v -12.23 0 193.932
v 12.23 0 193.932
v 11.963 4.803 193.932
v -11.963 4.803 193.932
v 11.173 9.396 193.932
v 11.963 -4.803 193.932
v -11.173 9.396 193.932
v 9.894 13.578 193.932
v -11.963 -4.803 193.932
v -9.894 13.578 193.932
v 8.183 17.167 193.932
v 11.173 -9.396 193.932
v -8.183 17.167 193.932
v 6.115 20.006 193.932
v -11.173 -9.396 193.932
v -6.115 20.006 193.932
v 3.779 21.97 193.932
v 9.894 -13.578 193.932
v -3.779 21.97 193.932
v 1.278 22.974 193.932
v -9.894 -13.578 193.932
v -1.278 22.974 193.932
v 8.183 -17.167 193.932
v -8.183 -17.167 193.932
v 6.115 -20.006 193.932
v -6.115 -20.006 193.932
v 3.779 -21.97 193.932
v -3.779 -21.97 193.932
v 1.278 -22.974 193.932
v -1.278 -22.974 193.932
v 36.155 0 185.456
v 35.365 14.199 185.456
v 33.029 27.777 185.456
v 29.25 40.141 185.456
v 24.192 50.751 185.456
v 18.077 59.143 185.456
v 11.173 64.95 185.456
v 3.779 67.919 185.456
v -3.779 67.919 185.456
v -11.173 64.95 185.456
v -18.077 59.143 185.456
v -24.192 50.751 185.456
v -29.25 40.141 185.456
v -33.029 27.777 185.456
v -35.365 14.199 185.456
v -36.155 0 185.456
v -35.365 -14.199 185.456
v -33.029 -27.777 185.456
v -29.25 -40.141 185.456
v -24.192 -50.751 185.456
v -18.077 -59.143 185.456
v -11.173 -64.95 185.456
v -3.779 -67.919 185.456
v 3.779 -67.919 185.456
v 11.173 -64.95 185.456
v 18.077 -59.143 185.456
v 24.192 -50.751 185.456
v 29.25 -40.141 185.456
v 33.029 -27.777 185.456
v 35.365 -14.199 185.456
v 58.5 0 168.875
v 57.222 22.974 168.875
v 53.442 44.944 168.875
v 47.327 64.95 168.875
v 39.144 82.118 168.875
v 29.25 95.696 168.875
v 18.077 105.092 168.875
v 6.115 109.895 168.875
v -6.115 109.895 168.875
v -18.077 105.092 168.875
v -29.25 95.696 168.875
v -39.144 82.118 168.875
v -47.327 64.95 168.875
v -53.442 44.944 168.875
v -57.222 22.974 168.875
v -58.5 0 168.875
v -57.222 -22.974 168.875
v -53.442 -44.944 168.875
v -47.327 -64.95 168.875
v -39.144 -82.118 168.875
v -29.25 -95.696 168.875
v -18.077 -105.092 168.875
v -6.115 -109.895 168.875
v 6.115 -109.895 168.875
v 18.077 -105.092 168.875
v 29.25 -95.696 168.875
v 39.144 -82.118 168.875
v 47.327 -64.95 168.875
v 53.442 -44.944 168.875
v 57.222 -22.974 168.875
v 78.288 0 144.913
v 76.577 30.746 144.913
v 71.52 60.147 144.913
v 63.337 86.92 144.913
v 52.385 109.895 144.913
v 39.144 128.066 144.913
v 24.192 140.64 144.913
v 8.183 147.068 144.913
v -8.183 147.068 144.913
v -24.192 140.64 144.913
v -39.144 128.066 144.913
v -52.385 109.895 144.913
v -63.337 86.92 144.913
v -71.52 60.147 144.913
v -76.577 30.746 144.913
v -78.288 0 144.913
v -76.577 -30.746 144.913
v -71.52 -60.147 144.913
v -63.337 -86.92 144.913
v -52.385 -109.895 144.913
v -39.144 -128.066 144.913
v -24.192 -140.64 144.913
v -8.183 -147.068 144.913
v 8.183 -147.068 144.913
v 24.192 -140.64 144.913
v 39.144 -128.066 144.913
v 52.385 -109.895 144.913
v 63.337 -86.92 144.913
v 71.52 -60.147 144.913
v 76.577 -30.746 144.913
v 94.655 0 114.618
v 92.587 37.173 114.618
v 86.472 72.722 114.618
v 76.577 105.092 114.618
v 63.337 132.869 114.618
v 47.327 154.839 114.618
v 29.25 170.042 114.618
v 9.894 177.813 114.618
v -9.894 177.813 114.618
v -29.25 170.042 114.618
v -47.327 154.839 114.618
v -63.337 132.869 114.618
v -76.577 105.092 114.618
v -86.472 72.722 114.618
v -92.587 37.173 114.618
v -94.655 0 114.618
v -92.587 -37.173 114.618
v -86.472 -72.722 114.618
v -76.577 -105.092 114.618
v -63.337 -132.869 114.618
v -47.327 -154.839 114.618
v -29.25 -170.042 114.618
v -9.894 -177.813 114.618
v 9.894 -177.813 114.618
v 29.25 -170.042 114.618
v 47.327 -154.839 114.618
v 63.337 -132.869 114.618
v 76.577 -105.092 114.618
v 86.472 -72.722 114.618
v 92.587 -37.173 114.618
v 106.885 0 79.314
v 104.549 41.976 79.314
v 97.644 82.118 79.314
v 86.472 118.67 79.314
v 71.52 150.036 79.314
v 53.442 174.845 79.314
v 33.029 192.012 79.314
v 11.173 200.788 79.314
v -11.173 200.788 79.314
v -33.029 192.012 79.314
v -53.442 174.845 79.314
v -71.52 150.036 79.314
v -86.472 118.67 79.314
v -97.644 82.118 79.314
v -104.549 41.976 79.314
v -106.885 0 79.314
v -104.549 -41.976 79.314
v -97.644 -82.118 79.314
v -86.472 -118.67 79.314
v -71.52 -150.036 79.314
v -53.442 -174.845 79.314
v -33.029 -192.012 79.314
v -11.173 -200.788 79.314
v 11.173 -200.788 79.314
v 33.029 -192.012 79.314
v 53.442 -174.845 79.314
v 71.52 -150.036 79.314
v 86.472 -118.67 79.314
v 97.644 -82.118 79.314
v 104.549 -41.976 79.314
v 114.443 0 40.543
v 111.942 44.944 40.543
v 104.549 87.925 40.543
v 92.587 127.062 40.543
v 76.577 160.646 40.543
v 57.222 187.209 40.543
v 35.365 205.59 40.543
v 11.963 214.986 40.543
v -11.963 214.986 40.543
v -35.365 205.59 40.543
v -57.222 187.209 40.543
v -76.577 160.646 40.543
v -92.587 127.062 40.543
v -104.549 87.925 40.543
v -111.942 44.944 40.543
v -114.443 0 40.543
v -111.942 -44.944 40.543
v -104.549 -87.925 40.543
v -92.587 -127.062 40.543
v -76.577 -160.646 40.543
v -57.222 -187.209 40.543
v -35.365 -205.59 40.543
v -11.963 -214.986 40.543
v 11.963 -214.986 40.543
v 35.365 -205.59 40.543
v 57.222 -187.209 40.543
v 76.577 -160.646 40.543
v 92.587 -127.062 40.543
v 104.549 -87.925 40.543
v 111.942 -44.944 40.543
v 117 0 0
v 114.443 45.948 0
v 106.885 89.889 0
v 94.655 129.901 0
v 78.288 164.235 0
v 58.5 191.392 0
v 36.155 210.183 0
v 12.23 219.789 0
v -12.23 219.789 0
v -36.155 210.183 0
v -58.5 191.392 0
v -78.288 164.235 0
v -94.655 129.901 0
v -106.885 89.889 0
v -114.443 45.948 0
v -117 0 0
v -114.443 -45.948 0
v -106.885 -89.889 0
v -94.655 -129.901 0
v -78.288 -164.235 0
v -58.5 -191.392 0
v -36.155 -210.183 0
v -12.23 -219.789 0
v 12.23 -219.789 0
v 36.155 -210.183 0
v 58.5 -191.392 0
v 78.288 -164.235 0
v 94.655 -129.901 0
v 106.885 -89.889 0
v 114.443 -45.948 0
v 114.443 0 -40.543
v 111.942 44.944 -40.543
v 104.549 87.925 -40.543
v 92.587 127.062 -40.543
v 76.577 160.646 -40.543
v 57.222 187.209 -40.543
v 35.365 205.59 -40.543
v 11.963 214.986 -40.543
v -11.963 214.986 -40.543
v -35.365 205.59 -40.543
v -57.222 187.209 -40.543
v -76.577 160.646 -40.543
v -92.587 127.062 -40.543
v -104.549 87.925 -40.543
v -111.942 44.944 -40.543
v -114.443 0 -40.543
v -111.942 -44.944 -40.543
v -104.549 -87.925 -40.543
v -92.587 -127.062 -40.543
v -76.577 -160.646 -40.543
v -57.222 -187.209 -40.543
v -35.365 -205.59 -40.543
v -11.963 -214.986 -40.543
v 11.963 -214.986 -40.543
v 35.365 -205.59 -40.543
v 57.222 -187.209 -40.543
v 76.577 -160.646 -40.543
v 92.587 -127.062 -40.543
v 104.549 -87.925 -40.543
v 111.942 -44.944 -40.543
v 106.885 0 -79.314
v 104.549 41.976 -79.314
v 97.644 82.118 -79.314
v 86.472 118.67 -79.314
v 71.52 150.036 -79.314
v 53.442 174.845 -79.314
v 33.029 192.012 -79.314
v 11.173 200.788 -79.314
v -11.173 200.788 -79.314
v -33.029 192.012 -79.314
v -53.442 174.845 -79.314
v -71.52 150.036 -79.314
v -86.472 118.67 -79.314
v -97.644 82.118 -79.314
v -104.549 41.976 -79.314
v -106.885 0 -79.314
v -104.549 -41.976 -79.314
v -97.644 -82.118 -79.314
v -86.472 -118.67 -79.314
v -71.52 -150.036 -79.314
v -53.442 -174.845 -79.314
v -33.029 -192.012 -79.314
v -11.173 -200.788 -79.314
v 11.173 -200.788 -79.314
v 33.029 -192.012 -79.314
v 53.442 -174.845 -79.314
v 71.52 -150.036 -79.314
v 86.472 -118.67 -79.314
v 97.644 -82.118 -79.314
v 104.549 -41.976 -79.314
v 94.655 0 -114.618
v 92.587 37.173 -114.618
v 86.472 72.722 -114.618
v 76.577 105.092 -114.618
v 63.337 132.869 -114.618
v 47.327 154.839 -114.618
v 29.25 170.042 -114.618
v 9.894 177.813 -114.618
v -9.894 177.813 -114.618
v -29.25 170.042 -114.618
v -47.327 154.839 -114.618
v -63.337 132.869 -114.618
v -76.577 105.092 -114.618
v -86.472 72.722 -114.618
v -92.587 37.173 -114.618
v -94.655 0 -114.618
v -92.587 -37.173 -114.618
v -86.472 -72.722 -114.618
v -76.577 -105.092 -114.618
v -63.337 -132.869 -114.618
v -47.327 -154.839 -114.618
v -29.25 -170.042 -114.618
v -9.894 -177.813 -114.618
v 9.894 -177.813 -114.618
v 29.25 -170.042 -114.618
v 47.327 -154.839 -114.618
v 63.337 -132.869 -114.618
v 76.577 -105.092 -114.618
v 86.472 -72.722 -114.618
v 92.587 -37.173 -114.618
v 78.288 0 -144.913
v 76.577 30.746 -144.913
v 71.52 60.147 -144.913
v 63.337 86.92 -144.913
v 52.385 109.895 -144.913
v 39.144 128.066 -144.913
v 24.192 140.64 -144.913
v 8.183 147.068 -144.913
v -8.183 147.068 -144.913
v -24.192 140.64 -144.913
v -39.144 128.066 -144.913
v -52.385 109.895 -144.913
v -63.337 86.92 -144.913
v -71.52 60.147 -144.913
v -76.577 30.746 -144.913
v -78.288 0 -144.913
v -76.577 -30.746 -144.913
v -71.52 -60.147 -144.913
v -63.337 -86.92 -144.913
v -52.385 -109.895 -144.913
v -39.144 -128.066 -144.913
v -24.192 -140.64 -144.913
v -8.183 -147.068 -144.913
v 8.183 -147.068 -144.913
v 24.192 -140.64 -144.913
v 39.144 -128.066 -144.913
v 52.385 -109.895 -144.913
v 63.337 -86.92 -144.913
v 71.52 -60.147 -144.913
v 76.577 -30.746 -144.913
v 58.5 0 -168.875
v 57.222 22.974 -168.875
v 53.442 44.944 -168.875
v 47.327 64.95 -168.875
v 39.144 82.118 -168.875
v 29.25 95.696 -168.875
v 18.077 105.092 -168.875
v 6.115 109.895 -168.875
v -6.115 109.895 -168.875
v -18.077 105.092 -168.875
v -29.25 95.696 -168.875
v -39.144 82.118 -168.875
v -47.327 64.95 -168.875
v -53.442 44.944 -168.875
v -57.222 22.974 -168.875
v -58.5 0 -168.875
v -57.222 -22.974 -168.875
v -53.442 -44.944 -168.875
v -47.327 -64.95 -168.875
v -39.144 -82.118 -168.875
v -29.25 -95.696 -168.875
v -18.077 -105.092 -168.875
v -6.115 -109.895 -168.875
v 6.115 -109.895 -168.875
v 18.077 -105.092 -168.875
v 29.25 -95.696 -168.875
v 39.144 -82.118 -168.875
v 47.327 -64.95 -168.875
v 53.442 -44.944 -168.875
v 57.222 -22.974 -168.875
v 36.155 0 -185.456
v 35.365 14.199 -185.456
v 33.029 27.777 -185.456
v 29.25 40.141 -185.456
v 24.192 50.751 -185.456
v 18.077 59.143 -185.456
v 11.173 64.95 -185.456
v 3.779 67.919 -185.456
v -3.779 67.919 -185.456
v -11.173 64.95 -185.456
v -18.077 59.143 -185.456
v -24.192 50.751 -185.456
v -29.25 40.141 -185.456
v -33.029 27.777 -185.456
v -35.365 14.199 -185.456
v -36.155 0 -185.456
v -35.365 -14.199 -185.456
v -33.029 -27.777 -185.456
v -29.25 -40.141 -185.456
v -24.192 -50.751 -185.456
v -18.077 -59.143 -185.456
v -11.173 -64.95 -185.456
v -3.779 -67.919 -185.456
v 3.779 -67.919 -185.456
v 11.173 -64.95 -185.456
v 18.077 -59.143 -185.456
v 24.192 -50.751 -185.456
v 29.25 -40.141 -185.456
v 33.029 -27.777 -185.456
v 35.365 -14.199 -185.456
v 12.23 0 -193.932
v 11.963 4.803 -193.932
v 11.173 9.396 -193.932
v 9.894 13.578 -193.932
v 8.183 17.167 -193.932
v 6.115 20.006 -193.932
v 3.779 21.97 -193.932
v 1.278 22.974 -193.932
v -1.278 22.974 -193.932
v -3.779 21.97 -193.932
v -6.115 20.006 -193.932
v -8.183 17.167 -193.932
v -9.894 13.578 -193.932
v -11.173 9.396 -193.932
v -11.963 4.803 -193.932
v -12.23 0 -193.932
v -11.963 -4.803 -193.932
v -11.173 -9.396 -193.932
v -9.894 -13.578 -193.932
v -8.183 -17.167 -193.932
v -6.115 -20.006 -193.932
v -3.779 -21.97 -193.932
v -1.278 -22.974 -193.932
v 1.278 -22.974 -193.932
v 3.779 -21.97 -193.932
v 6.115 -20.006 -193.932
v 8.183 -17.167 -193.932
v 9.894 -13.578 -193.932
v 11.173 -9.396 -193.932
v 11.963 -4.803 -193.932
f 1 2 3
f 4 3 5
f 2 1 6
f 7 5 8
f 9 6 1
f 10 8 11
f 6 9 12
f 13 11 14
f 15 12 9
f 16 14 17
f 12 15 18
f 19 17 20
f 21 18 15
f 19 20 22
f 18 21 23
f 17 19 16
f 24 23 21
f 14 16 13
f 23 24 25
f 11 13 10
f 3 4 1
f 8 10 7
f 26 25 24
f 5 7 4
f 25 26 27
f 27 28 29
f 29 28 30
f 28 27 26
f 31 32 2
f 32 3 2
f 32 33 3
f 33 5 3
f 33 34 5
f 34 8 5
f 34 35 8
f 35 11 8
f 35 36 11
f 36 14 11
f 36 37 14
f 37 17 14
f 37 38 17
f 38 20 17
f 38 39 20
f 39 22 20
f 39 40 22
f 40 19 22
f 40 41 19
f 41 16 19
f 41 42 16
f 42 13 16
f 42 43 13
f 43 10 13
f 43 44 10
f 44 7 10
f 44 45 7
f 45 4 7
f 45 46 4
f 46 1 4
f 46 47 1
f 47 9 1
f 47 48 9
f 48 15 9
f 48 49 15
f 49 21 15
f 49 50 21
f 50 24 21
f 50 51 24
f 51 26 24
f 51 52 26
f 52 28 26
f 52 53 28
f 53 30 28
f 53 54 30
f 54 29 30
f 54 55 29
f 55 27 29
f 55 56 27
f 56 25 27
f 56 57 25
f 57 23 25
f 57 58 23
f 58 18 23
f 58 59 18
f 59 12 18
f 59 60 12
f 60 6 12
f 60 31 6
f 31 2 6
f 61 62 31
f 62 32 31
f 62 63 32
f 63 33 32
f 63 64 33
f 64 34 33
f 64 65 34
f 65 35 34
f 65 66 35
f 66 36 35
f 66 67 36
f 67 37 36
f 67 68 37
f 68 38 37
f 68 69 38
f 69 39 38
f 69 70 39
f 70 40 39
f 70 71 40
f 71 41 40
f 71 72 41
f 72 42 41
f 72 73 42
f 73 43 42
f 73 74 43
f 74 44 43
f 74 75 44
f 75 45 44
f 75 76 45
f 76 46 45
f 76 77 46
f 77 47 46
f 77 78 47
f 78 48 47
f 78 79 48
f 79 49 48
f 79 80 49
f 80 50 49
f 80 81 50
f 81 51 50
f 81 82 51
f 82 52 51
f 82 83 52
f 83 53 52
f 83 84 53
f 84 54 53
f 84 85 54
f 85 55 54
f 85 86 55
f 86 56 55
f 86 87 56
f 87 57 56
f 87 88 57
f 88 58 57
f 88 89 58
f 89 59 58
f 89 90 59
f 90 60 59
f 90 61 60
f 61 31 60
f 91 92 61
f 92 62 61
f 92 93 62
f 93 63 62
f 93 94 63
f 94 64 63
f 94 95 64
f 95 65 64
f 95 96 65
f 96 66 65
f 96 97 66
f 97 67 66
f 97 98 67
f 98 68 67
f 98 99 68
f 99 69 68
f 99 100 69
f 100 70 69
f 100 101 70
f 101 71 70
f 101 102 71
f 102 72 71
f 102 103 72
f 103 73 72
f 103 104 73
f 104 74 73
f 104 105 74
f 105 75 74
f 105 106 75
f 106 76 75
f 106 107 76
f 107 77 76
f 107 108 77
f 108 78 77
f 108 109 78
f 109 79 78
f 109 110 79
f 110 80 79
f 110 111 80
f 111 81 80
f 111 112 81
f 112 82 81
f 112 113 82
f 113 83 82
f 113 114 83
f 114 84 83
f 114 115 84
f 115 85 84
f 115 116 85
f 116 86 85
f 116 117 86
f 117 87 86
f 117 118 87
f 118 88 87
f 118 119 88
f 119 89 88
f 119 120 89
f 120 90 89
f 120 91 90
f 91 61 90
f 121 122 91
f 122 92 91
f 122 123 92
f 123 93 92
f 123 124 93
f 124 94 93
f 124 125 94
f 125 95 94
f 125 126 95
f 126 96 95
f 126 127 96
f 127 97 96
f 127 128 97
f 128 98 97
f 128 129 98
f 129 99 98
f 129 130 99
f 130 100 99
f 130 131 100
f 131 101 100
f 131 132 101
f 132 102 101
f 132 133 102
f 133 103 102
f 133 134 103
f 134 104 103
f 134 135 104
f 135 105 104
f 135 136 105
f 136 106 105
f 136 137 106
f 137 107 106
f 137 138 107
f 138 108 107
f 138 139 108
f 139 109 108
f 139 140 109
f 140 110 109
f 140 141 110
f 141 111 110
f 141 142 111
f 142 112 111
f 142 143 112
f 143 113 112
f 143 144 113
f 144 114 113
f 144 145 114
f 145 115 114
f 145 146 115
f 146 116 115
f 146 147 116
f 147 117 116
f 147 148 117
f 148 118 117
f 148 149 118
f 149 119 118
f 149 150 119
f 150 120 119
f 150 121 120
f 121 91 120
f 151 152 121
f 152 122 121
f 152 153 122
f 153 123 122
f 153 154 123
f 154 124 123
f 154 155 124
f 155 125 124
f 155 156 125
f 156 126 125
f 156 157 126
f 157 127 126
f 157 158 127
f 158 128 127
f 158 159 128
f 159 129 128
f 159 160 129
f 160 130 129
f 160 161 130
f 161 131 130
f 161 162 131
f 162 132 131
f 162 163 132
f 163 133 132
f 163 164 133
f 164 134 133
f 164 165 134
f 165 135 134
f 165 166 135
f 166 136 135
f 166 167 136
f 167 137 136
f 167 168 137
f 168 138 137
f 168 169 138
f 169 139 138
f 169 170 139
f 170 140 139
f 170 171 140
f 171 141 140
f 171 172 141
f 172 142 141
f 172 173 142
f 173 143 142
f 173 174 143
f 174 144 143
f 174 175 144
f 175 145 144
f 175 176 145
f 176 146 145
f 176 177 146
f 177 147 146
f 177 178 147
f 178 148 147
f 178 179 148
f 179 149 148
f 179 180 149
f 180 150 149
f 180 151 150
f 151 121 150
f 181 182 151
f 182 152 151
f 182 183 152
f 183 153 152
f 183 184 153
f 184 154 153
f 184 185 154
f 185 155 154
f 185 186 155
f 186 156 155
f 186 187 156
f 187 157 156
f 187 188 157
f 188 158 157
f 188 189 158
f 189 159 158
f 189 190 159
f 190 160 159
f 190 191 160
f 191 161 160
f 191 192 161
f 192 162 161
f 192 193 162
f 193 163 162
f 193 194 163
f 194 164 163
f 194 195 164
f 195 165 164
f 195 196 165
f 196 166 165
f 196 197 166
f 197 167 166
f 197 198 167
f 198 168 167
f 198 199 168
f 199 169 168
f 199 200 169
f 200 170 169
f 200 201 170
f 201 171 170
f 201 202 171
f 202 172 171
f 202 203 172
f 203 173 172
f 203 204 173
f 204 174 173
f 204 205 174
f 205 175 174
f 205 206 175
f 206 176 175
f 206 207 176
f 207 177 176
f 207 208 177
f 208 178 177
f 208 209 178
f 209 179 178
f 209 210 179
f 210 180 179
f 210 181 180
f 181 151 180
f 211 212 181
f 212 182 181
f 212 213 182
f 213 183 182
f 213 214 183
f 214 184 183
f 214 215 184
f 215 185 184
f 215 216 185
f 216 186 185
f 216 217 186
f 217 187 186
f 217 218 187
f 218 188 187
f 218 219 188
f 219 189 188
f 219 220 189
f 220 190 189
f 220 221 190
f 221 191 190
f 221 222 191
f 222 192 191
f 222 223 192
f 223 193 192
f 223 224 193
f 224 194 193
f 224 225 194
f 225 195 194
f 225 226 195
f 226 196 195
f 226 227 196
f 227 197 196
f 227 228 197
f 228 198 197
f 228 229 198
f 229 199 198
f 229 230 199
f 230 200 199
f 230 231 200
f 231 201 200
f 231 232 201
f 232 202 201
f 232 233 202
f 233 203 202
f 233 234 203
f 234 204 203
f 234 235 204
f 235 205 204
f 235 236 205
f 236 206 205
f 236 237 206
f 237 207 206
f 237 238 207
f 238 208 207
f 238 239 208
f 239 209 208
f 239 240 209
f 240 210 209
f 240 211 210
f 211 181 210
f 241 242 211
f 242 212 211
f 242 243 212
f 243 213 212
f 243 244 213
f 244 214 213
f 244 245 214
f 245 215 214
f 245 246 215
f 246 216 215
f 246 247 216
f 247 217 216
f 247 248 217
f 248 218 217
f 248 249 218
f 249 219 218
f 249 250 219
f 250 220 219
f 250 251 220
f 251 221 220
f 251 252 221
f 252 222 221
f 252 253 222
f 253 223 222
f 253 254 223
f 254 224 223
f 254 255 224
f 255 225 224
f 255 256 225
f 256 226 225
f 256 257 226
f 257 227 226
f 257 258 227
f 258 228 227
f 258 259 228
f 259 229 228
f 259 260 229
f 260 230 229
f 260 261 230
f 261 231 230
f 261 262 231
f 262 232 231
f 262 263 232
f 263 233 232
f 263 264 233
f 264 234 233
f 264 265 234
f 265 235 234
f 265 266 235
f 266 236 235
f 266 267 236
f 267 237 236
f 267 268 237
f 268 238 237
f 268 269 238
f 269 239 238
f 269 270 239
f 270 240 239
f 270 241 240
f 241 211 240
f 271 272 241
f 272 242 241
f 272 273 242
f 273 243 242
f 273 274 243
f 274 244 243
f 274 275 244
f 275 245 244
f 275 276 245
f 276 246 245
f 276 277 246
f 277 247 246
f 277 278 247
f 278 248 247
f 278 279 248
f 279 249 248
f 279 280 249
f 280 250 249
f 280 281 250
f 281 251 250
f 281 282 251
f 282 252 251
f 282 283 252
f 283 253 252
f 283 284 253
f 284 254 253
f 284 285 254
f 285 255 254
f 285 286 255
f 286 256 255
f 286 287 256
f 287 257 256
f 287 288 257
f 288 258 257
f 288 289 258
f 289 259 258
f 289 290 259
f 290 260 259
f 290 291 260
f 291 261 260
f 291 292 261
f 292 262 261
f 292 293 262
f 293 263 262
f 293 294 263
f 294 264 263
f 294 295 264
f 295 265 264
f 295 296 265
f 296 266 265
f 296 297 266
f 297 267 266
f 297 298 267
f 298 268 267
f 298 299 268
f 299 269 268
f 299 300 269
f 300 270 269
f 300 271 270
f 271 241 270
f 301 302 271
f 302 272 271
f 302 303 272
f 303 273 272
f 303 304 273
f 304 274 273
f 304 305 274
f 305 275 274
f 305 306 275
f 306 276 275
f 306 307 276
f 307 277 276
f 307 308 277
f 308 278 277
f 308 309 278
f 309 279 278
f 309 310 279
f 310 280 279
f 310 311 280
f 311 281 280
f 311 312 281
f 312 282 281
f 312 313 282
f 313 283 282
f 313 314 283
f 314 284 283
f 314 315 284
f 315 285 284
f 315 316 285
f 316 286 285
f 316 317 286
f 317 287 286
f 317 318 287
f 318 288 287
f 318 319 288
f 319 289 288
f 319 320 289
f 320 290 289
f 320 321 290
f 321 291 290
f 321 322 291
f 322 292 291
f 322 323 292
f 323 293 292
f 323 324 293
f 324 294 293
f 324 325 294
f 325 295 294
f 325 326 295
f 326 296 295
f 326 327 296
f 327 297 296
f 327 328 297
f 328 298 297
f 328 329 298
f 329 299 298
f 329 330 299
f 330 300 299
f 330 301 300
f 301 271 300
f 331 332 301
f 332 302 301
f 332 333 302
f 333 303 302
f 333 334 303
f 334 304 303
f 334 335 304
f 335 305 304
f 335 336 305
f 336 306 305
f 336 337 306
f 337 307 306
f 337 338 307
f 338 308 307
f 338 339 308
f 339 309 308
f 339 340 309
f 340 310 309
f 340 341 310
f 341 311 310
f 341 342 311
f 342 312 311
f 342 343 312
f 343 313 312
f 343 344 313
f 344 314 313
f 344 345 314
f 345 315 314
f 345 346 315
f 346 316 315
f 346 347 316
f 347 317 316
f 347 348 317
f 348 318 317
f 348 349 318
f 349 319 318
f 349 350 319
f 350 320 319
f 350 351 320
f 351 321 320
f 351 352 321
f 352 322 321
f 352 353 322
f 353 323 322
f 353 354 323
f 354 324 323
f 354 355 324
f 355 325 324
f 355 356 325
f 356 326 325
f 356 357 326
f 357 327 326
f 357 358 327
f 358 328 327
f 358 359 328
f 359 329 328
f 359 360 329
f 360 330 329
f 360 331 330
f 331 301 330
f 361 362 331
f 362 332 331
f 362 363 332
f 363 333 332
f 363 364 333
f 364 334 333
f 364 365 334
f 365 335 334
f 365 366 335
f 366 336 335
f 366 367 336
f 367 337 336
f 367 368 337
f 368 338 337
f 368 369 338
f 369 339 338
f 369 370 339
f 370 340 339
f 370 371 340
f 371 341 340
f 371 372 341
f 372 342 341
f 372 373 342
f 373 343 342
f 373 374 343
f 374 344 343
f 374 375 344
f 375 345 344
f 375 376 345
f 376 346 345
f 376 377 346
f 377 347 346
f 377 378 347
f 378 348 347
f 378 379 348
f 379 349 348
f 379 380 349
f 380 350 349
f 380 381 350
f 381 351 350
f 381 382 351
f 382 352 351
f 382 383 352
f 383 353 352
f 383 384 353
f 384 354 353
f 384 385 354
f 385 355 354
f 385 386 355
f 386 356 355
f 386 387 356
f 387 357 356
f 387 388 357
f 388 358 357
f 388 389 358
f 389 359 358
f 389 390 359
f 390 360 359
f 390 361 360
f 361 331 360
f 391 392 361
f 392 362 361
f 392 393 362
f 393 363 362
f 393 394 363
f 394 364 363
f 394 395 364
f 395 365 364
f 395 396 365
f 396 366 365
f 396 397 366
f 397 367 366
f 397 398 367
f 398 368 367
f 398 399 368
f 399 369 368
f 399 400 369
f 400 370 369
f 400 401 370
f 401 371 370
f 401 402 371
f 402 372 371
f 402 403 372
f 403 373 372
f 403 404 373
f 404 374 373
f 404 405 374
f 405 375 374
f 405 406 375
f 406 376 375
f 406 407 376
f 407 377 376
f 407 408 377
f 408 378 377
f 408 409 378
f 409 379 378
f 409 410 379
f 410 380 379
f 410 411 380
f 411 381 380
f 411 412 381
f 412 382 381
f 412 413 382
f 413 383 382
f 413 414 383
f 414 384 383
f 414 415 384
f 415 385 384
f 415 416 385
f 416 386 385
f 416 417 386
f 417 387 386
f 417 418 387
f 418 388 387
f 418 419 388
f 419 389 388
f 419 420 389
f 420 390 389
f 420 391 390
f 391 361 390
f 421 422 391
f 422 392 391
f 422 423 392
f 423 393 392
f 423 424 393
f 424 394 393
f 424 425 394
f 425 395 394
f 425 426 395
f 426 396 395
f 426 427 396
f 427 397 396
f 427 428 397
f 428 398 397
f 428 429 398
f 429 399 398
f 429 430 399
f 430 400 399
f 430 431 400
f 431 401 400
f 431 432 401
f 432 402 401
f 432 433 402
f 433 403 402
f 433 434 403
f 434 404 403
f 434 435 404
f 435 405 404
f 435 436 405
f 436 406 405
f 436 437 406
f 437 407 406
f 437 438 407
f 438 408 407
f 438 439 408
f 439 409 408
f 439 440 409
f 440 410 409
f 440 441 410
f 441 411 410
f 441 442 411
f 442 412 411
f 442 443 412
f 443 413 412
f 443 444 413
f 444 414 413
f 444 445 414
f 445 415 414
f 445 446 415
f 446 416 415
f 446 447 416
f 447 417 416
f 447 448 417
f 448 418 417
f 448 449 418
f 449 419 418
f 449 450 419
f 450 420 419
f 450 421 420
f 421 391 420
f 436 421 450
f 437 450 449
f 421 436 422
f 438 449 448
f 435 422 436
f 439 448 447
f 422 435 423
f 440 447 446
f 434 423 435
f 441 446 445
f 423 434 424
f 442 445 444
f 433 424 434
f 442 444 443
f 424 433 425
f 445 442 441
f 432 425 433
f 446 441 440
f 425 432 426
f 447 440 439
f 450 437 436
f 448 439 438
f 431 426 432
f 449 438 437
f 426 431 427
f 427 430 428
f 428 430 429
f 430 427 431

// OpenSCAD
// Generated by SolidPython 1.0.1 on 2020-07-29 00:46:49


scale(v = [9, 17, 15]) {
	sphere(r = 13);
}
/***********************************************
*********      SolidPython code:      **********
************************************************
 
# import packages: SolidPython
from solid import *
from solid.utils import *
from itertools import chain, combinations, permutations


class Resize:

    def __init__(self, scad_file):
        self.scad_file = scad_file
        #self.scad_file = import_scad(scad_file)
        # cone/cylinder param:
        self.r1 = 0
        self.r2 = 0
        self.h = 0
        # rectangular prism param:
        self.w = 0
        self.l = 0
        # ellipse param:
        self.r = 0

    # import OpenScad code (file name corresponds to shape)


    # classify shape + parameters
    def assign(self, param1, param2, param3):
        if self.scad_file == 'cone.scad':
            self.r1 = param1
            self.r2 = param2
            self.h = param3
        elif self.scad_file == 'cylinder.scad':
            self.r1 = param1
            self.r2 = param2
            self.h = param3
        elif self.scad_file == 'rectangularPrism.scad':
            self.h = param1
            self.l = param2
            self.w = param3
        else:
            self.r = param1
            self.h = param2

    # resize parameters
    def iterate(self):
        x = range(3, 20, 2)
        i = 1
        if self.scad_file == 'cone.scad':
            tempList = list(permutations(x, 2))
            for temp in tempList:
                param1 = temp[0]
                param2 = temp[1]
                filepath = 'produced_scad_files/' + 'cone' + str(param1) + '_' + str(param2) + '_' + '.scad'
                scad_render_to_file(cylinder(h=param1, r1=param2, r2=0), filepath)

        elif self.scad_file == 'cylinder.scad':
            tempList = list(permutations(x, 3))
            for temp in tempList:
                param1 = temp[0]
                param2 = temp[1]
                filepath = 'produced_scad_files/' + 'cylinder' + str(param1) + '_' + str(param2) + '_' + '.scad'
                scad_render_to_file(cylinder(h=param1, r1=param2, r2=param2), filepath)

        elif self.scad_file == 'rectangularPrism.scad':
            tempList = list(permutations(x, 3))
            for temp in tempList:
                param1 = temp[0]
                param2 = temp[1]
                param3 = temp[2]
                filepath = 'produced_scad_files/' + 'rectangularPrism' + str(param1) + '_' + str(param2) + '_' + str(
                    param3) + '.scad'
                scad_render_to_file(cube(size=(param1, param2, param3)), filepath)

        elif self.scad_file == 'ellipse.scad':
            tempList = list(permutations(x, 4))
            for temp in tempList:
                param1 = temp[0]
                param2 = temp[1]
                param3 = temp[2]
                param4 = temp[3]
                filepath = 'produced_scad_files/' + 'ellipse' + str(param1) + '_' + str(param2) + '_' + str(param3) + '_' + str(param4) + '.scad'
                scad_render_to_file(scale([param1, param2, param3])(sphere(r=param4)), filepath)

    def render_to_scadfile(self):
        scad_render_to_file(scad, 'example.scad') 
 
************************************************/
